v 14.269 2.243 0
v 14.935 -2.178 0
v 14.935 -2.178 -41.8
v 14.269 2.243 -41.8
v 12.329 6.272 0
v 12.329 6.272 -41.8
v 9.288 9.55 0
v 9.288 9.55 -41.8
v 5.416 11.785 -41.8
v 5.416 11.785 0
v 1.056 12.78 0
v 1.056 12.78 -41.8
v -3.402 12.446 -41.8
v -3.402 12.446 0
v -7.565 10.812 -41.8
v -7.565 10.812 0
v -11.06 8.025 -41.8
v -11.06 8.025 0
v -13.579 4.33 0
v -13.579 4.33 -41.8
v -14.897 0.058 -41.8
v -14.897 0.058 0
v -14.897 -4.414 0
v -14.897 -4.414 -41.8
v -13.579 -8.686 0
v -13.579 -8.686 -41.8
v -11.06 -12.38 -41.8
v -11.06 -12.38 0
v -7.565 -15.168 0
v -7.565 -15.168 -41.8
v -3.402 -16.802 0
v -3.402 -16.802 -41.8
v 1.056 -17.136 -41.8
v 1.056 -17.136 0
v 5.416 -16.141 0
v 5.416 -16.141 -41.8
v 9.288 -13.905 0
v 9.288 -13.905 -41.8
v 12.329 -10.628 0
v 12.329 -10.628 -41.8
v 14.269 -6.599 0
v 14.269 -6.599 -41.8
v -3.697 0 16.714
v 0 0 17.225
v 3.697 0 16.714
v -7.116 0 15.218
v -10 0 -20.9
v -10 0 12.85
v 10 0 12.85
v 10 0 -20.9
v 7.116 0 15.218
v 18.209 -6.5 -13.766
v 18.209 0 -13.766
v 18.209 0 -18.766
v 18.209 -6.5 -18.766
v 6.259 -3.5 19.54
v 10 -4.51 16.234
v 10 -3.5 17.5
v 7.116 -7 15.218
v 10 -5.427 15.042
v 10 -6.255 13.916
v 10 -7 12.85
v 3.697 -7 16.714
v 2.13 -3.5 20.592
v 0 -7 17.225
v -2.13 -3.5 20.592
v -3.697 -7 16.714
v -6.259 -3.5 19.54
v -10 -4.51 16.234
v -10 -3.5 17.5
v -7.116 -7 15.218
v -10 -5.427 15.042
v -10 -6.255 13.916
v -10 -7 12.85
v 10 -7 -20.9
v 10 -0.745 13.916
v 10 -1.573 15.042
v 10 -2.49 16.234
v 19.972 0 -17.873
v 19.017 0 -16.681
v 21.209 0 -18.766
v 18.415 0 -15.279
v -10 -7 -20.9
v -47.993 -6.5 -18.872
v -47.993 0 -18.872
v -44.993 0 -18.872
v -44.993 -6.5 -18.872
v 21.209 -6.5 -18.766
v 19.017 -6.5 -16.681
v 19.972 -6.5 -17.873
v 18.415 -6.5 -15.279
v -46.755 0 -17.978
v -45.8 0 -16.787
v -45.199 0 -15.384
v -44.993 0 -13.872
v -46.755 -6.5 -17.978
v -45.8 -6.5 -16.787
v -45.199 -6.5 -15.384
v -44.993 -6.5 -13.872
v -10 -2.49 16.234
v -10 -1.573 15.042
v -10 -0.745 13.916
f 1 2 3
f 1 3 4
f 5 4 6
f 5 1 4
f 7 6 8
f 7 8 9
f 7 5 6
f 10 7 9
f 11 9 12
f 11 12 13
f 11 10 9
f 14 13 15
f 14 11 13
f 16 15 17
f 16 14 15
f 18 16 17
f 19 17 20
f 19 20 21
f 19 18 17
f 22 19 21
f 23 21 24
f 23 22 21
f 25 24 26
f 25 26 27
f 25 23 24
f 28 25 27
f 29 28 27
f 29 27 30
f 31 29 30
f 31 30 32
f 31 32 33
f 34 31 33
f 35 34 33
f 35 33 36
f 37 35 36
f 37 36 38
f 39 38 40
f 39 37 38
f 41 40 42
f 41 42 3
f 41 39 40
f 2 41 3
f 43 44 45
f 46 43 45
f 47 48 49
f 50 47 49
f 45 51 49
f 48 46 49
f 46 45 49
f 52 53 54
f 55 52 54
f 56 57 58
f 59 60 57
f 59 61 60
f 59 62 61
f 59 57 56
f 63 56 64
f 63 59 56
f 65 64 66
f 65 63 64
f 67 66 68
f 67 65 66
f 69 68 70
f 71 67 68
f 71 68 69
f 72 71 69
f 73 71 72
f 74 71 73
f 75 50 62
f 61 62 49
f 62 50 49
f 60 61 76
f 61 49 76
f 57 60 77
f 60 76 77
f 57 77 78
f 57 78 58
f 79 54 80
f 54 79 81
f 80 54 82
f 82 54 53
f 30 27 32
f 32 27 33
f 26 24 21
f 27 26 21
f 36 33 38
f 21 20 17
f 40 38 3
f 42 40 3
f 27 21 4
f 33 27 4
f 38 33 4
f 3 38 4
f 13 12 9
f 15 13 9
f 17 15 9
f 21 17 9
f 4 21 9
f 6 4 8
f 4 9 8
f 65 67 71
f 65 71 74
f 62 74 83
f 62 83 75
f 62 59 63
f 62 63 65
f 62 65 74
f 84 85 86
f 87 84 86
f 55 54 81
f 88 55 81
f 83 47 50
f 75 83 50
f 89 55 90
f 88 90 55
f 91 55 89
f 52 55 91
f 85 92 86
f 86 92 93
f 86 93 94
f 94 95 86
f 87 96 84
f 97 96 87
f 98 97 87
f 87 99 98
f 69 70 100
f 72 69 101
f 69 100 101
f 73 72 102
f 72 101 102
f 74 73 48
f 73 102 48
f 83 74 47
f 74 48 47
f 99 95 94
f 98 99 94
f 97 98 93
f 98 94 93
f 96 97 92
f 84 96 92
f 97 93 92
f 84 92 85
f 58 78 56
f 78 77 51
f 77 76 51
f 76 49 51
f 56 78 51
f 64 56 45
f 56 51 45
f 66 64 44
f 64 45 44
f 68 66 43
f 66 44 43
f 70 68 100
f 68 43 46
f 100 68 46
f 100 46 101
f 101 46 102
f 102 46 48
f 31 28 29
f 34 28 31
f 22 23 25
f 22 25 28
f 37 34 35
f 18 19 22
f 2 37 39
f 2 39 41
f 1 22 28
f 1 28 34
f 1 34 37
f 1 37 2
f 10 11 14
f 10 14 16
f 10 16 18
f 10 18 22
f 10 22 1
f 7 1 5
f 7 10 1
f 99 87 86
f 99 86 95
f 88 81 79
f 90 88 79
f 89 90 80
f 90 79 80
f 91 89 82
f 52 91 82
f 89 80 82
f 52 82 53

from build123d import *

# Parameters (mm, degrees)
F1_DEPTH = 7
F2_SIZE2 = 3.5
F2_SIZE  = 3.5
F3_SIZE  = 3.49999
F4_R     = 15
F5_DEPTH = 41.8
F8_DEPTH = 6.5
F9_DEPTH = 6.5


# Not quite as in the source:
# - a fillet or chamfer is up to 0.001 mm smaller than in the source, because OpenCascade refuses the exact size


with BuildPart() as f1:
    # F0 (on Front) → F1 (new body)
    with BuildSketch(Plane.XZ):
        with BuildLine():
            Line((-10, 17.5), (-10, -20.9))
            Line((-10, -20.9), (10, -20.9))
            Line((10, -20.9), (10, 17.5))
            ThreePointArc((10, 17.5), (0, 20.7252194443), (-10, 17.5))
        make_face()
    extrude(amount=F1_DEPTH)

    # F2
    f2_edges = [f1.edges().sort_by_distance(p)[0] for p in [
        (0, -7, 20.725219),
    ]]
    chamfer(f2_edges, length=F2_SIZE, length2=F2_SIZE2)

    # F3 (size 3.5 in the source; OpenCascade refuses exactly that, so slightly less here)
    f3_edges = [f1.edges().sort_by_distance(p)[0] for p in [
        (0, 0, 20.725219),
    ]]
    chamfer(f3_edges, length=F3_SIZE)


with BuildPart() as f5:
    # F4 (on Top) → F5 (new body)
    with BuildSketch(Plane.XY):
        with Locations((-0.06460234, -2.1778875962)):
            Circle(F4_R)
    extrude(amount=-F5_DEPTH)


with BuildPart() as f8:
    # F7 (on Front) → F8 (new body)
    with BuildSketch(Plane.XZ):
        with BuildLine():
            Line((18.2094871998, -13.7658946961), (18.2094871998, -18.7658946961))
            Line((18.2094871998, -18.7658946961), (21.2094871998, -18.7658946961))
            ThreePointArc((21.2094871998, -18.7658946961), (19.0170272874, -16.6813706435), (18.2094871998, -13.7658946961))
        make_face()
    extrude(amount=F8_DEPTH)


with BuildPart() as f9:
    # F6 (on Front) → F9 (new body)
    with BuildSketch(Plane.XZ):
        with BuildLine():
            ThreePointArc((-44.992926091, -13.8715998083), (-45.8004661786, -16.7870757558), (-47.992926091, -18.8715998083))
            Line((-47.992926091, -18.8715998083), (-44.992926091, -18.8715998083))
            Line((-44.992926091, -18.8715998083), (-44.992926091, -13.8715998083))
        make_face()
    extrude(amount=F9_DEPTH)


solid = Compound([f1.part, f5.part, f8.part, f9.part])
